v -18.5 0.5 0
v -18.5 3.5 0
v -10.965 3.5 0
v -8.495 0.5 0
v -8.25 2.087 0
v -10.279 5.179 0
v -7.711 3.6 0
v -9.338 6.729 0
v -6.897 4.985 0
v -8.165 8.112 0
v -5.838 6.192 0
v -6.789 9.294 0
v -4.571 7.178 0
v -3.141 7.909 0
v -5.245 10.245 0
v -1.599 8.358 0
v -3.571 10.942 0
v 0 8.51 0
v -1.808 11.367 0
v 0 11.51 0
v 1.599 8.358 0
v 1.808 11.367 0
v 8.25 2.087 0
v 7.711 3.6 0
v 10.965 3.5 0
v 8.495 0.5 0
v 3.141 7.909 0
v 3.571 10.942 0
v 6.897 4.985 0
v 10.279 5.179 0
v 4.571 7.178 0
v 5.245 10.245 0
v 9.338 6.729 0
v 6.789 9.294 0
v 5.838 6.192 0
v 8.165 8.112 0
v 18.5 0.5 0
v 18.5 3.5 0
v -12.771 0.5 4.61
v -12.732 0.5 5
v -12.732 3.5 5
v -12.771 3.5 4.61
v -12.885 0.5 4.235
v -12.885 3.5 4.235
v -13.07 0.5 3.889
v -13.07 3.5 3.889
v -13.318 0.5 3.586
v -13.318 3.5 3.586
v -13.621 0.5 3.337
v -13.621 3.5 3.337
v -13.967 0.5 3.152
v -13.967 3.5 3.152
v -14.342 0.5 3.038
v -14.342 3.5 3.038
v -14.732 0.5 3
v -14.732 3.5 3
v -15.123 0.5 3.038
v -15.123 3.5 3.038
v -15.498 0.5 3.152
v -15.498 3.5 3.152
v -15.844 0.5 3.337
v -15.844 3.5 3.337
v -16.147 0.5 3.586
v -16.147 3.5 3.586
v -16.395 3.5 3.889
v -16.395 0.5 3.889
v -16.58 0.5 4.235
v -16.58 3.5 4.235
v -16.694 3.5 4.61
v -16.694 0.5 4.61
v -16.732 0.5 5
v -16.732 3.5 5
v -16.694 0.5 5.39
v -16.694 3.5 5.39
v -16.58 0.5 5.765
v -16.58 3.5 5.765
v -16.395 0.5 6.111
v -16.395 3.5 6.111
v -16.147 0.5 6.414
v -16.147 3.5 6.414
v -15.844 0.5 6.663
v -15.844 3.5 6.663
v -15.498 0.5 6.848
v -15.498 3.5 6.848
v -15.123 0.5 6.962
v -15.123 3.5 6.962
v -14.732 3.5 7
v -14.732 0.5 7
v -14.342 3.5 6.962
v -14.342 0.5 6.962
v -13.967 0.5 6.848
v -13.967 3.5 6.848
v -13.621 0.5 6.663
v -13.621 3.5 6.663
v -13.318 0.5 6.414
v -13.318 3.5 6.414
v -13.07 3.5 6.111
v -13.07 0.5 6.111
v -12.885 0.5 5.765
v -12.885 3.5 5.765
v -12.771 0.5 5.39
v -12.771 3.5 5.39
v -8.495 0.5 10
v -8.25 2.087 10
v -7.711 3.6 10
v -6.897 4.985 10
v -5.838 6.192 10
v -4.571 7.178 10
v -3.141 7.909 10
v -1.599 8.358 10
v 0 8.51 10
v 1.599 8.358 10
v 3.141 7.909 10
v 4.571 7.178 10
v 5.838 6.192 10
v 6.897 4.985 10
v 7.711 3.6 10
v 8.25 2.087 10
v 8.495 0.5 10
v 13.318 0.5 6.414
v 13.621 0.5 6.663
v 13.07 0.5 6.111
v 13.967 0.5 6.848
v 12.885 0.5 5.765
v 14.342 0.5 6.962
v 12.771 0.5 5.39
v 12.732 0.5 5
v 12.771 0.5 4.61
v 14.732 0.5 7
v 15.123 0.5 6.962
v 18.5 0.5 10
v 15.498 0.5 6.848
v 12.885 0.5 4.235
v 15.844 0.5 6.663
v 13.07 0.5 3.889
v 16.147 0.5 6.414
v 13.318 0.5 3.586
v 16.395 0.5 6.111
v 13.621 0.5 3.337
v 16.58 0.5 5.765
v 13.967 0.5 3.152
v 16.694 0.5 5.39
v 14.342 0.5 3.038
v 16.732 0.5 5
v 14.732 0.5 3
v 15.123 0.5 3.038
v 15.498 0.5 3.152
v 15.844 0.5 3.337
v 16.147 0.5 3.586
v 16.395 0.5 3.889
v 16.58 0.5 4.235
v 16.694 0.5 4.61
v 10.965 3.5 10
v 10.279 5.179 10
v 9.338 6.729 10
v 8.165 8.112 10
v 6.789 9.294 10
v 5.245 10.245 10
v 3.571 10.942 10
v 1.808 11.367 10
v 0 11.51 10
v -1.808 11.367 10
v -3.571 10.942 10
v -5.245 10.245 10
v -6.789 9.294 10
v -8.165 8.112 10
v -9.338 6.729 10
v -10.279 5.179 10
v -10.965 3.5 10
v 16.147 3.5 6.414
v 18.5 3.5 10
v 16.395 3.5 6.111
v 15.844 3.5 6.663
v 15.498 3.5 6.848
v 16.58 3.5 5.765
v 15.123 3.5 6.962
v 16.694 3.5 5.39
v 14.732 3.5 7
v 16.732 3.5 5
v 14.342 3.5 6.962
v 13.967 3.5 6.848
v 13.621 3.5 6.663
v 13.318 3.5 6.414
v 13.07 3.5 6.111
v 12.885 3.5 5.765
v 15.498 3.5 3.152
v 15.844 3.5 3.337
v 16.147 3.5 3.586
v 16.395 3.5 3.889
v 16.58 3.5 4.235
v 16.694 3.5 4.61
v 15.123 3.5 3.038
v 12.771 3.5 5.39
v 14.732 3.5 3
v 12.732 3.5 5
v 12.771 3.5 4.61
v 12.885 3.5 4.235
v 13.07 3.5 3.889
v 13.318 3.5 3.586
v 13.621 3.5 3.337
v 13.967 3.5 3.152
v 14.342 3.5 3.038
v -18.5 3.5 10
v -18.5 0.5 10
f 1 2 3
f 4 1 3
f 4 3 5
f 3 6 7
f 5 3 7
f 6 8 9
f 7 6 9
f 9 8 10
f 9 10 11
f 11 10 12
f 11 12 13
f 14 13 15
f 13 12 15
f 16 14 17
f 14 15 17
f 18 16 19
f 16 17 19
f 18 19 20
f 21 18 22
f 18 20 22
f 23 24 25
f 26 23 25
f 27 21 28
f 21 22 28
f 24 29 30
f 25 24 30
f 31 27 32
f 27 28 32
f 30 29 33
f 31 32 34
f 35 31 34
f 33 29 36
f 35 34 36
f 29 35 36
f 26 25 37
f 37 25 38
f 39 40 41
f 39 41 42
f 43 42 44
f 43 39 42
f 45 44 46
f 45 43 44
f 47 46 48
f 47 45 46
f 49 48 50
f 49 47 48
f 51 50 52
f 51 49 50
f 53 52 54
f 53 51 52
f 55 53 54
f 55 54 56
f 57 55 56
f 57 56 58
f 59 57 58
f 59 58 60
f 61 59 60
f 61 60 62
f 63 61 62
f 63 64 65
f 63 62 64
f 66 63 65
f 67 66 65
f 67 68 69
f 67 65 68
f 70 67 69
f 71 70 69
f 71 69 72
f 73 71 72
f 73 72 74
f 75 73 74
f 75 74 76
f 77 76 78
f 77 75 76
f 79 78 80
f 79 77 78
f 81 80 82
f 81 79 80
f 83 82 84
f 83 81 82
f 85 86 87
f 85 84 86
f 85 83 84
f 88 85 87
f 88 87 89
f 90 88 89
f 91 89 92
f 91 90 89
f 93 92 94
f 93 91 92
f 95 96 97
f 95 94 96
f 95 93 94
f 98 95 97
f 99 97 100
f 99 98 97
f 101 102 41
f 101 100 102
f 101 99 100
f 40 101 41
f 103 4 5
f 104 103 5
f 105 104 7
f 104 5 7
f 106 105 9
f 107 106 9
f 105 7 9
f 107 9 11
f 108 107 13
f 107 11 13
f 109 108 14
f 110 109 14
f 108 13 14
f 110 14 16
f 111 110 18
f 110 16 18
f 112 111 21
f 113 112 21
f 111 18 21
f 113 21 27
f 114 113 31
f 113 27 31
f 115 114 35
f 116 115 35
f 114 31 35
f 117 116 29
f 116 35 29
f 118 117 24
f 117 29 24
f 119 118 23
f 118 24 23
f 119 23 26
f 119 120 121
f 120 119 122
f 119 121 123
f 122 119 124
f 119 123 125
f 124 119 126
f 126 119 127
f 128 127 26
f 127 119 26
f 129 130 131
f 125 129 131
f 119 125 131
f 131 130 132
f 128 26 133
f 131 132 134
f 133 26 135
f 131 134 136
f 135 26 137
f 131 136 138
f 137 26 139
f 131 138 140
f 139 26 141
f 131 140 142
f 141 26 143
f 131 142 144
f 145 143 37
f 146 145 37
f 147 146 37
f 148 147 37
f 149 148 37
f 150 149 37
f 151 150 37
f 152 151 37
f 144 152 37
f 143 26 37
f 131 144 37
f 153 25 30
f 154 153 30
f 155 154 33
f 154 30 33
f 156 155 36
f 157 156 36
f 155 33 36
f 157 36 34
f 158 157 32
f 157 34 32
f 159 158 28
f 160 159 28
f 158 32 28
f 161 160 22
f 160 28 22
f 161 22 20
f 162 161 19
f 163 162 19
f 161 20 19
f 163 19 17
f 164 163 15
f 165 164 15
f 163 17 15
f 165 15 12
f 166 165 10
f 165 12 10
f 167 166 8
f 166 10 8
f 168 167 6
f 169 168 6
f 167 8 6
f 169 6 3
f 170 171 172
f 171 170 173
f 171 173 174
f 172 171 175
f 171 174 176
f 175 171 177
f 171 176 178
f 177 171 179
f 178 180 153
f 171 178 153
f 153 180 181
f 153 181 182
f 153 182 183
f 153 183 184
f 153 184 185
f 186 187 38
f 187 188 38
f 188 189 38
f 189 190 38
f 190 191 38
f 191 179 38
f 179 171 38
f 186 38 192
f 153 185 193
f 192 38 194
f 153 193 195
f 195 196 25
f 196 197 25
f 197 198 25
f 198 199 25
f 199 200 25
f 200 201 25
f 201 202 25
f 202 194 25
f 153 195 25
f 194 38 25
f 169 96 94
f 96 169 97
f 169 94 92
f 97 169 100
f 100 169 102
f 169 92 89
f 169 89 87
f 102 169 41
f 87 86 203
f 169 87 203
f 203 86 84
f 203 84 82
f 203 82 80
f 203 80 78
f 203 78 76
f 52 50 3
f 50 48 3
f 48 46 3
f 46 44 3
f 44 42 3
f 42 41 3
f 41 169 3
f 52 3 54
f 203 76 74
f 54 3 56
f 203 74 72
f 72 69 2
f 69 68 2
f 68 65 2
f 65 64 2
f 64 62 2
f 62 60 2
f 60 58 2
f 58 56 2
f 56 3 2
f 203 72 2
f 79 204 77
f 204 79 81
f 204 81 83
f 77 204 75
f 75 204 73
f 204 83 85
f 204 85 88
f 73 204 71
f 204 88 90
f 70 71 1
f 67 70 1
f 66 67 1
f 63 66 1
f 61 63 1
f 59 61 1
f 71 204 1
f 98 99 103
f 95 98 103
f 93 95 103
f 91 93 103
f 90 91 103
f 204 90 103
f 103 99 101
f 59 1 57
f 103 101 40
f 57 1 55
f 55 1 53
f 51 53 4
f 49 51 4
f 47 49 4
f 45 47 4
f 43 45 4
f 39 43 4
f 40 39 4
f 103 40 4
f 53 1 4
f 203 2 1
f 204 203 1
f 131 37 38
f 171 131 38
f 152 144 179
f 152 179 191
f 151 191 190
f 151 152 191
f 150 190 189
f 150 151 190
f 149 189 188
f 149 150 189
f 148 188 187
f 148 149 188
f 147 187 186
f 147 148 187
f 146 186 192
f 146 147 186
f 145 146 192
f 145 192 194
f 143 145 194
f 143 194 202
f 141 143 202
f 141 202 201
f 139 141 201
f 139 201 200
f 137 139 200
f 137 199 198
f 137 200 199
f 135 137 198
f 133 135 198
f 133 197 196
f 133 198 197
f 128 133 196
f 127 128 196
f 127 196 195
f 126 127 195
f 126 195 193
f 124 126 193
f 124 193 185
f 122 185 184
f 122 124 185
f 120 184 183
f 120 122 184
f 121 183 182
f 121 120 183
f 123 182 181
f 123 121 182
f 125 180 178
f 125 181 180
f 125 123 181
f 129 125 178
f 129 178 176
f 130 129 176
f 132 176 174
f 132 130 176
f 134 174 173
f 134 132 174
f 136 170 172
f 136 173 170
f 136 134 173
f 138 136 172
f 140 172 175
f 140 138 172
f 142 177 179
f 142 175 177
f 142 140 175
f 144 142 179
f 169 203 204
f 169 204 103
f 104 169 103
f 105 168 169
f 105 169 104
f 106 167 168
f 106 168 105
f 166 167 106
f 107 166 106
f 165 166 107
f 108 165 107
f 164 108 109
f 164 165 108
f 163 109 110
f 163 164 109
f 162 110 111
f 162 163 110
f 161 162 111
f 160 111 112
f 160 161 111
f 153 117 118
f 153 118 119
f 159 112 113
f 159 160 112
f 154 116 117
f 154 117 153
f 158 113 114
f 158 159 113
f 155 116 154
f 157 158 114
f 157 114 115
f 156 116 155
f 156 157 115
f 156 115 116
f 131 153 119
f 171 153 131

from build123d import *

# Parameters (mm, degrees)
BOSS_EXTRUDE1_DEPTH = 10
CUT_EXTRUDE3_REACH  = 13.51
SKETCH2_R           = 2


with BuildPart() as part:
    # Sketch1 → Boss-Extrude1 (new body)
    with BuildSketch(Plane.XY):
        with BuildLine():
            Line((8.4952987, 0.5), (18.5, 0.5))
            Line((18.5, 0.5), (18.5, 3.500157096))
            Line((18.5, 3.500157096), (10.964898554, 3.500157096))
            ThreePointArc((10.964898554, 3.500157096), (0, 11.51), (-10.964898554, 3.500157096))
            Line((-10.964898554, 3.500157096), (-18.5, 3.500157096))
            Line((-18.5, 3.500157096), (-18.5, 0.5))
            Line((-18.5, 0.5), (-8.4952987, 0.5))
            ThreePointArc((-8.4952987, 0.5), (0, 8.51), (8.4952987, 0.5))
        make_face()
    extrude(amount=BOSS_EXTRUDE1_DEPTH)

    # Sketch2 → Cut-Extrude3 (cut, up to next)
    with BuildSketch(Plane(origin=(0, 0, 0), x_dir=(1, 0, 0), z_dir=(0, 1, 0)), mode=Mode.PRIVATE) as cut_extrude3_sk1:
        with Locations((-14.732448989, -5)):
            Circle(SKETCH2_R)
    cut_extrude3_tool1 = extrude(cut_extrude3_sk1.sketch, amount=CUT_EXTRUDE3_REACH, mode=Mode.PRIVATE) & part.part
    add(cut_extrude3_tool1.solids().sort_by_distance((-14.732449, 0, 5))[0], mode=Mode.SUBTRACT)
    # Sketch2 → Cut-Extrude3 (cut, up to next)
    with BuildSketch(Plane(origin=(0, 0, 0), x_dir=(1, 0, 0), z_dir=(0, 1, 0)), mode=Mode.PRIVATE) as cut_extrude3_sk2:
        with Locations((14.732448989, -5)):
            Circle(SKETCH2_R)
    cut_extrude3_tool2 = extrude(cut_extrude3_sk2.sketch, amount=CUT_EXTRUDE3_REACH, mode=Mode.PRIVATE) & part.part
    add(cut_extrude3_tool2.solids().sort_by_distance((14.732449, 0, 5))[0], mode=Mode.SUBTRACT)


solid = part.part
